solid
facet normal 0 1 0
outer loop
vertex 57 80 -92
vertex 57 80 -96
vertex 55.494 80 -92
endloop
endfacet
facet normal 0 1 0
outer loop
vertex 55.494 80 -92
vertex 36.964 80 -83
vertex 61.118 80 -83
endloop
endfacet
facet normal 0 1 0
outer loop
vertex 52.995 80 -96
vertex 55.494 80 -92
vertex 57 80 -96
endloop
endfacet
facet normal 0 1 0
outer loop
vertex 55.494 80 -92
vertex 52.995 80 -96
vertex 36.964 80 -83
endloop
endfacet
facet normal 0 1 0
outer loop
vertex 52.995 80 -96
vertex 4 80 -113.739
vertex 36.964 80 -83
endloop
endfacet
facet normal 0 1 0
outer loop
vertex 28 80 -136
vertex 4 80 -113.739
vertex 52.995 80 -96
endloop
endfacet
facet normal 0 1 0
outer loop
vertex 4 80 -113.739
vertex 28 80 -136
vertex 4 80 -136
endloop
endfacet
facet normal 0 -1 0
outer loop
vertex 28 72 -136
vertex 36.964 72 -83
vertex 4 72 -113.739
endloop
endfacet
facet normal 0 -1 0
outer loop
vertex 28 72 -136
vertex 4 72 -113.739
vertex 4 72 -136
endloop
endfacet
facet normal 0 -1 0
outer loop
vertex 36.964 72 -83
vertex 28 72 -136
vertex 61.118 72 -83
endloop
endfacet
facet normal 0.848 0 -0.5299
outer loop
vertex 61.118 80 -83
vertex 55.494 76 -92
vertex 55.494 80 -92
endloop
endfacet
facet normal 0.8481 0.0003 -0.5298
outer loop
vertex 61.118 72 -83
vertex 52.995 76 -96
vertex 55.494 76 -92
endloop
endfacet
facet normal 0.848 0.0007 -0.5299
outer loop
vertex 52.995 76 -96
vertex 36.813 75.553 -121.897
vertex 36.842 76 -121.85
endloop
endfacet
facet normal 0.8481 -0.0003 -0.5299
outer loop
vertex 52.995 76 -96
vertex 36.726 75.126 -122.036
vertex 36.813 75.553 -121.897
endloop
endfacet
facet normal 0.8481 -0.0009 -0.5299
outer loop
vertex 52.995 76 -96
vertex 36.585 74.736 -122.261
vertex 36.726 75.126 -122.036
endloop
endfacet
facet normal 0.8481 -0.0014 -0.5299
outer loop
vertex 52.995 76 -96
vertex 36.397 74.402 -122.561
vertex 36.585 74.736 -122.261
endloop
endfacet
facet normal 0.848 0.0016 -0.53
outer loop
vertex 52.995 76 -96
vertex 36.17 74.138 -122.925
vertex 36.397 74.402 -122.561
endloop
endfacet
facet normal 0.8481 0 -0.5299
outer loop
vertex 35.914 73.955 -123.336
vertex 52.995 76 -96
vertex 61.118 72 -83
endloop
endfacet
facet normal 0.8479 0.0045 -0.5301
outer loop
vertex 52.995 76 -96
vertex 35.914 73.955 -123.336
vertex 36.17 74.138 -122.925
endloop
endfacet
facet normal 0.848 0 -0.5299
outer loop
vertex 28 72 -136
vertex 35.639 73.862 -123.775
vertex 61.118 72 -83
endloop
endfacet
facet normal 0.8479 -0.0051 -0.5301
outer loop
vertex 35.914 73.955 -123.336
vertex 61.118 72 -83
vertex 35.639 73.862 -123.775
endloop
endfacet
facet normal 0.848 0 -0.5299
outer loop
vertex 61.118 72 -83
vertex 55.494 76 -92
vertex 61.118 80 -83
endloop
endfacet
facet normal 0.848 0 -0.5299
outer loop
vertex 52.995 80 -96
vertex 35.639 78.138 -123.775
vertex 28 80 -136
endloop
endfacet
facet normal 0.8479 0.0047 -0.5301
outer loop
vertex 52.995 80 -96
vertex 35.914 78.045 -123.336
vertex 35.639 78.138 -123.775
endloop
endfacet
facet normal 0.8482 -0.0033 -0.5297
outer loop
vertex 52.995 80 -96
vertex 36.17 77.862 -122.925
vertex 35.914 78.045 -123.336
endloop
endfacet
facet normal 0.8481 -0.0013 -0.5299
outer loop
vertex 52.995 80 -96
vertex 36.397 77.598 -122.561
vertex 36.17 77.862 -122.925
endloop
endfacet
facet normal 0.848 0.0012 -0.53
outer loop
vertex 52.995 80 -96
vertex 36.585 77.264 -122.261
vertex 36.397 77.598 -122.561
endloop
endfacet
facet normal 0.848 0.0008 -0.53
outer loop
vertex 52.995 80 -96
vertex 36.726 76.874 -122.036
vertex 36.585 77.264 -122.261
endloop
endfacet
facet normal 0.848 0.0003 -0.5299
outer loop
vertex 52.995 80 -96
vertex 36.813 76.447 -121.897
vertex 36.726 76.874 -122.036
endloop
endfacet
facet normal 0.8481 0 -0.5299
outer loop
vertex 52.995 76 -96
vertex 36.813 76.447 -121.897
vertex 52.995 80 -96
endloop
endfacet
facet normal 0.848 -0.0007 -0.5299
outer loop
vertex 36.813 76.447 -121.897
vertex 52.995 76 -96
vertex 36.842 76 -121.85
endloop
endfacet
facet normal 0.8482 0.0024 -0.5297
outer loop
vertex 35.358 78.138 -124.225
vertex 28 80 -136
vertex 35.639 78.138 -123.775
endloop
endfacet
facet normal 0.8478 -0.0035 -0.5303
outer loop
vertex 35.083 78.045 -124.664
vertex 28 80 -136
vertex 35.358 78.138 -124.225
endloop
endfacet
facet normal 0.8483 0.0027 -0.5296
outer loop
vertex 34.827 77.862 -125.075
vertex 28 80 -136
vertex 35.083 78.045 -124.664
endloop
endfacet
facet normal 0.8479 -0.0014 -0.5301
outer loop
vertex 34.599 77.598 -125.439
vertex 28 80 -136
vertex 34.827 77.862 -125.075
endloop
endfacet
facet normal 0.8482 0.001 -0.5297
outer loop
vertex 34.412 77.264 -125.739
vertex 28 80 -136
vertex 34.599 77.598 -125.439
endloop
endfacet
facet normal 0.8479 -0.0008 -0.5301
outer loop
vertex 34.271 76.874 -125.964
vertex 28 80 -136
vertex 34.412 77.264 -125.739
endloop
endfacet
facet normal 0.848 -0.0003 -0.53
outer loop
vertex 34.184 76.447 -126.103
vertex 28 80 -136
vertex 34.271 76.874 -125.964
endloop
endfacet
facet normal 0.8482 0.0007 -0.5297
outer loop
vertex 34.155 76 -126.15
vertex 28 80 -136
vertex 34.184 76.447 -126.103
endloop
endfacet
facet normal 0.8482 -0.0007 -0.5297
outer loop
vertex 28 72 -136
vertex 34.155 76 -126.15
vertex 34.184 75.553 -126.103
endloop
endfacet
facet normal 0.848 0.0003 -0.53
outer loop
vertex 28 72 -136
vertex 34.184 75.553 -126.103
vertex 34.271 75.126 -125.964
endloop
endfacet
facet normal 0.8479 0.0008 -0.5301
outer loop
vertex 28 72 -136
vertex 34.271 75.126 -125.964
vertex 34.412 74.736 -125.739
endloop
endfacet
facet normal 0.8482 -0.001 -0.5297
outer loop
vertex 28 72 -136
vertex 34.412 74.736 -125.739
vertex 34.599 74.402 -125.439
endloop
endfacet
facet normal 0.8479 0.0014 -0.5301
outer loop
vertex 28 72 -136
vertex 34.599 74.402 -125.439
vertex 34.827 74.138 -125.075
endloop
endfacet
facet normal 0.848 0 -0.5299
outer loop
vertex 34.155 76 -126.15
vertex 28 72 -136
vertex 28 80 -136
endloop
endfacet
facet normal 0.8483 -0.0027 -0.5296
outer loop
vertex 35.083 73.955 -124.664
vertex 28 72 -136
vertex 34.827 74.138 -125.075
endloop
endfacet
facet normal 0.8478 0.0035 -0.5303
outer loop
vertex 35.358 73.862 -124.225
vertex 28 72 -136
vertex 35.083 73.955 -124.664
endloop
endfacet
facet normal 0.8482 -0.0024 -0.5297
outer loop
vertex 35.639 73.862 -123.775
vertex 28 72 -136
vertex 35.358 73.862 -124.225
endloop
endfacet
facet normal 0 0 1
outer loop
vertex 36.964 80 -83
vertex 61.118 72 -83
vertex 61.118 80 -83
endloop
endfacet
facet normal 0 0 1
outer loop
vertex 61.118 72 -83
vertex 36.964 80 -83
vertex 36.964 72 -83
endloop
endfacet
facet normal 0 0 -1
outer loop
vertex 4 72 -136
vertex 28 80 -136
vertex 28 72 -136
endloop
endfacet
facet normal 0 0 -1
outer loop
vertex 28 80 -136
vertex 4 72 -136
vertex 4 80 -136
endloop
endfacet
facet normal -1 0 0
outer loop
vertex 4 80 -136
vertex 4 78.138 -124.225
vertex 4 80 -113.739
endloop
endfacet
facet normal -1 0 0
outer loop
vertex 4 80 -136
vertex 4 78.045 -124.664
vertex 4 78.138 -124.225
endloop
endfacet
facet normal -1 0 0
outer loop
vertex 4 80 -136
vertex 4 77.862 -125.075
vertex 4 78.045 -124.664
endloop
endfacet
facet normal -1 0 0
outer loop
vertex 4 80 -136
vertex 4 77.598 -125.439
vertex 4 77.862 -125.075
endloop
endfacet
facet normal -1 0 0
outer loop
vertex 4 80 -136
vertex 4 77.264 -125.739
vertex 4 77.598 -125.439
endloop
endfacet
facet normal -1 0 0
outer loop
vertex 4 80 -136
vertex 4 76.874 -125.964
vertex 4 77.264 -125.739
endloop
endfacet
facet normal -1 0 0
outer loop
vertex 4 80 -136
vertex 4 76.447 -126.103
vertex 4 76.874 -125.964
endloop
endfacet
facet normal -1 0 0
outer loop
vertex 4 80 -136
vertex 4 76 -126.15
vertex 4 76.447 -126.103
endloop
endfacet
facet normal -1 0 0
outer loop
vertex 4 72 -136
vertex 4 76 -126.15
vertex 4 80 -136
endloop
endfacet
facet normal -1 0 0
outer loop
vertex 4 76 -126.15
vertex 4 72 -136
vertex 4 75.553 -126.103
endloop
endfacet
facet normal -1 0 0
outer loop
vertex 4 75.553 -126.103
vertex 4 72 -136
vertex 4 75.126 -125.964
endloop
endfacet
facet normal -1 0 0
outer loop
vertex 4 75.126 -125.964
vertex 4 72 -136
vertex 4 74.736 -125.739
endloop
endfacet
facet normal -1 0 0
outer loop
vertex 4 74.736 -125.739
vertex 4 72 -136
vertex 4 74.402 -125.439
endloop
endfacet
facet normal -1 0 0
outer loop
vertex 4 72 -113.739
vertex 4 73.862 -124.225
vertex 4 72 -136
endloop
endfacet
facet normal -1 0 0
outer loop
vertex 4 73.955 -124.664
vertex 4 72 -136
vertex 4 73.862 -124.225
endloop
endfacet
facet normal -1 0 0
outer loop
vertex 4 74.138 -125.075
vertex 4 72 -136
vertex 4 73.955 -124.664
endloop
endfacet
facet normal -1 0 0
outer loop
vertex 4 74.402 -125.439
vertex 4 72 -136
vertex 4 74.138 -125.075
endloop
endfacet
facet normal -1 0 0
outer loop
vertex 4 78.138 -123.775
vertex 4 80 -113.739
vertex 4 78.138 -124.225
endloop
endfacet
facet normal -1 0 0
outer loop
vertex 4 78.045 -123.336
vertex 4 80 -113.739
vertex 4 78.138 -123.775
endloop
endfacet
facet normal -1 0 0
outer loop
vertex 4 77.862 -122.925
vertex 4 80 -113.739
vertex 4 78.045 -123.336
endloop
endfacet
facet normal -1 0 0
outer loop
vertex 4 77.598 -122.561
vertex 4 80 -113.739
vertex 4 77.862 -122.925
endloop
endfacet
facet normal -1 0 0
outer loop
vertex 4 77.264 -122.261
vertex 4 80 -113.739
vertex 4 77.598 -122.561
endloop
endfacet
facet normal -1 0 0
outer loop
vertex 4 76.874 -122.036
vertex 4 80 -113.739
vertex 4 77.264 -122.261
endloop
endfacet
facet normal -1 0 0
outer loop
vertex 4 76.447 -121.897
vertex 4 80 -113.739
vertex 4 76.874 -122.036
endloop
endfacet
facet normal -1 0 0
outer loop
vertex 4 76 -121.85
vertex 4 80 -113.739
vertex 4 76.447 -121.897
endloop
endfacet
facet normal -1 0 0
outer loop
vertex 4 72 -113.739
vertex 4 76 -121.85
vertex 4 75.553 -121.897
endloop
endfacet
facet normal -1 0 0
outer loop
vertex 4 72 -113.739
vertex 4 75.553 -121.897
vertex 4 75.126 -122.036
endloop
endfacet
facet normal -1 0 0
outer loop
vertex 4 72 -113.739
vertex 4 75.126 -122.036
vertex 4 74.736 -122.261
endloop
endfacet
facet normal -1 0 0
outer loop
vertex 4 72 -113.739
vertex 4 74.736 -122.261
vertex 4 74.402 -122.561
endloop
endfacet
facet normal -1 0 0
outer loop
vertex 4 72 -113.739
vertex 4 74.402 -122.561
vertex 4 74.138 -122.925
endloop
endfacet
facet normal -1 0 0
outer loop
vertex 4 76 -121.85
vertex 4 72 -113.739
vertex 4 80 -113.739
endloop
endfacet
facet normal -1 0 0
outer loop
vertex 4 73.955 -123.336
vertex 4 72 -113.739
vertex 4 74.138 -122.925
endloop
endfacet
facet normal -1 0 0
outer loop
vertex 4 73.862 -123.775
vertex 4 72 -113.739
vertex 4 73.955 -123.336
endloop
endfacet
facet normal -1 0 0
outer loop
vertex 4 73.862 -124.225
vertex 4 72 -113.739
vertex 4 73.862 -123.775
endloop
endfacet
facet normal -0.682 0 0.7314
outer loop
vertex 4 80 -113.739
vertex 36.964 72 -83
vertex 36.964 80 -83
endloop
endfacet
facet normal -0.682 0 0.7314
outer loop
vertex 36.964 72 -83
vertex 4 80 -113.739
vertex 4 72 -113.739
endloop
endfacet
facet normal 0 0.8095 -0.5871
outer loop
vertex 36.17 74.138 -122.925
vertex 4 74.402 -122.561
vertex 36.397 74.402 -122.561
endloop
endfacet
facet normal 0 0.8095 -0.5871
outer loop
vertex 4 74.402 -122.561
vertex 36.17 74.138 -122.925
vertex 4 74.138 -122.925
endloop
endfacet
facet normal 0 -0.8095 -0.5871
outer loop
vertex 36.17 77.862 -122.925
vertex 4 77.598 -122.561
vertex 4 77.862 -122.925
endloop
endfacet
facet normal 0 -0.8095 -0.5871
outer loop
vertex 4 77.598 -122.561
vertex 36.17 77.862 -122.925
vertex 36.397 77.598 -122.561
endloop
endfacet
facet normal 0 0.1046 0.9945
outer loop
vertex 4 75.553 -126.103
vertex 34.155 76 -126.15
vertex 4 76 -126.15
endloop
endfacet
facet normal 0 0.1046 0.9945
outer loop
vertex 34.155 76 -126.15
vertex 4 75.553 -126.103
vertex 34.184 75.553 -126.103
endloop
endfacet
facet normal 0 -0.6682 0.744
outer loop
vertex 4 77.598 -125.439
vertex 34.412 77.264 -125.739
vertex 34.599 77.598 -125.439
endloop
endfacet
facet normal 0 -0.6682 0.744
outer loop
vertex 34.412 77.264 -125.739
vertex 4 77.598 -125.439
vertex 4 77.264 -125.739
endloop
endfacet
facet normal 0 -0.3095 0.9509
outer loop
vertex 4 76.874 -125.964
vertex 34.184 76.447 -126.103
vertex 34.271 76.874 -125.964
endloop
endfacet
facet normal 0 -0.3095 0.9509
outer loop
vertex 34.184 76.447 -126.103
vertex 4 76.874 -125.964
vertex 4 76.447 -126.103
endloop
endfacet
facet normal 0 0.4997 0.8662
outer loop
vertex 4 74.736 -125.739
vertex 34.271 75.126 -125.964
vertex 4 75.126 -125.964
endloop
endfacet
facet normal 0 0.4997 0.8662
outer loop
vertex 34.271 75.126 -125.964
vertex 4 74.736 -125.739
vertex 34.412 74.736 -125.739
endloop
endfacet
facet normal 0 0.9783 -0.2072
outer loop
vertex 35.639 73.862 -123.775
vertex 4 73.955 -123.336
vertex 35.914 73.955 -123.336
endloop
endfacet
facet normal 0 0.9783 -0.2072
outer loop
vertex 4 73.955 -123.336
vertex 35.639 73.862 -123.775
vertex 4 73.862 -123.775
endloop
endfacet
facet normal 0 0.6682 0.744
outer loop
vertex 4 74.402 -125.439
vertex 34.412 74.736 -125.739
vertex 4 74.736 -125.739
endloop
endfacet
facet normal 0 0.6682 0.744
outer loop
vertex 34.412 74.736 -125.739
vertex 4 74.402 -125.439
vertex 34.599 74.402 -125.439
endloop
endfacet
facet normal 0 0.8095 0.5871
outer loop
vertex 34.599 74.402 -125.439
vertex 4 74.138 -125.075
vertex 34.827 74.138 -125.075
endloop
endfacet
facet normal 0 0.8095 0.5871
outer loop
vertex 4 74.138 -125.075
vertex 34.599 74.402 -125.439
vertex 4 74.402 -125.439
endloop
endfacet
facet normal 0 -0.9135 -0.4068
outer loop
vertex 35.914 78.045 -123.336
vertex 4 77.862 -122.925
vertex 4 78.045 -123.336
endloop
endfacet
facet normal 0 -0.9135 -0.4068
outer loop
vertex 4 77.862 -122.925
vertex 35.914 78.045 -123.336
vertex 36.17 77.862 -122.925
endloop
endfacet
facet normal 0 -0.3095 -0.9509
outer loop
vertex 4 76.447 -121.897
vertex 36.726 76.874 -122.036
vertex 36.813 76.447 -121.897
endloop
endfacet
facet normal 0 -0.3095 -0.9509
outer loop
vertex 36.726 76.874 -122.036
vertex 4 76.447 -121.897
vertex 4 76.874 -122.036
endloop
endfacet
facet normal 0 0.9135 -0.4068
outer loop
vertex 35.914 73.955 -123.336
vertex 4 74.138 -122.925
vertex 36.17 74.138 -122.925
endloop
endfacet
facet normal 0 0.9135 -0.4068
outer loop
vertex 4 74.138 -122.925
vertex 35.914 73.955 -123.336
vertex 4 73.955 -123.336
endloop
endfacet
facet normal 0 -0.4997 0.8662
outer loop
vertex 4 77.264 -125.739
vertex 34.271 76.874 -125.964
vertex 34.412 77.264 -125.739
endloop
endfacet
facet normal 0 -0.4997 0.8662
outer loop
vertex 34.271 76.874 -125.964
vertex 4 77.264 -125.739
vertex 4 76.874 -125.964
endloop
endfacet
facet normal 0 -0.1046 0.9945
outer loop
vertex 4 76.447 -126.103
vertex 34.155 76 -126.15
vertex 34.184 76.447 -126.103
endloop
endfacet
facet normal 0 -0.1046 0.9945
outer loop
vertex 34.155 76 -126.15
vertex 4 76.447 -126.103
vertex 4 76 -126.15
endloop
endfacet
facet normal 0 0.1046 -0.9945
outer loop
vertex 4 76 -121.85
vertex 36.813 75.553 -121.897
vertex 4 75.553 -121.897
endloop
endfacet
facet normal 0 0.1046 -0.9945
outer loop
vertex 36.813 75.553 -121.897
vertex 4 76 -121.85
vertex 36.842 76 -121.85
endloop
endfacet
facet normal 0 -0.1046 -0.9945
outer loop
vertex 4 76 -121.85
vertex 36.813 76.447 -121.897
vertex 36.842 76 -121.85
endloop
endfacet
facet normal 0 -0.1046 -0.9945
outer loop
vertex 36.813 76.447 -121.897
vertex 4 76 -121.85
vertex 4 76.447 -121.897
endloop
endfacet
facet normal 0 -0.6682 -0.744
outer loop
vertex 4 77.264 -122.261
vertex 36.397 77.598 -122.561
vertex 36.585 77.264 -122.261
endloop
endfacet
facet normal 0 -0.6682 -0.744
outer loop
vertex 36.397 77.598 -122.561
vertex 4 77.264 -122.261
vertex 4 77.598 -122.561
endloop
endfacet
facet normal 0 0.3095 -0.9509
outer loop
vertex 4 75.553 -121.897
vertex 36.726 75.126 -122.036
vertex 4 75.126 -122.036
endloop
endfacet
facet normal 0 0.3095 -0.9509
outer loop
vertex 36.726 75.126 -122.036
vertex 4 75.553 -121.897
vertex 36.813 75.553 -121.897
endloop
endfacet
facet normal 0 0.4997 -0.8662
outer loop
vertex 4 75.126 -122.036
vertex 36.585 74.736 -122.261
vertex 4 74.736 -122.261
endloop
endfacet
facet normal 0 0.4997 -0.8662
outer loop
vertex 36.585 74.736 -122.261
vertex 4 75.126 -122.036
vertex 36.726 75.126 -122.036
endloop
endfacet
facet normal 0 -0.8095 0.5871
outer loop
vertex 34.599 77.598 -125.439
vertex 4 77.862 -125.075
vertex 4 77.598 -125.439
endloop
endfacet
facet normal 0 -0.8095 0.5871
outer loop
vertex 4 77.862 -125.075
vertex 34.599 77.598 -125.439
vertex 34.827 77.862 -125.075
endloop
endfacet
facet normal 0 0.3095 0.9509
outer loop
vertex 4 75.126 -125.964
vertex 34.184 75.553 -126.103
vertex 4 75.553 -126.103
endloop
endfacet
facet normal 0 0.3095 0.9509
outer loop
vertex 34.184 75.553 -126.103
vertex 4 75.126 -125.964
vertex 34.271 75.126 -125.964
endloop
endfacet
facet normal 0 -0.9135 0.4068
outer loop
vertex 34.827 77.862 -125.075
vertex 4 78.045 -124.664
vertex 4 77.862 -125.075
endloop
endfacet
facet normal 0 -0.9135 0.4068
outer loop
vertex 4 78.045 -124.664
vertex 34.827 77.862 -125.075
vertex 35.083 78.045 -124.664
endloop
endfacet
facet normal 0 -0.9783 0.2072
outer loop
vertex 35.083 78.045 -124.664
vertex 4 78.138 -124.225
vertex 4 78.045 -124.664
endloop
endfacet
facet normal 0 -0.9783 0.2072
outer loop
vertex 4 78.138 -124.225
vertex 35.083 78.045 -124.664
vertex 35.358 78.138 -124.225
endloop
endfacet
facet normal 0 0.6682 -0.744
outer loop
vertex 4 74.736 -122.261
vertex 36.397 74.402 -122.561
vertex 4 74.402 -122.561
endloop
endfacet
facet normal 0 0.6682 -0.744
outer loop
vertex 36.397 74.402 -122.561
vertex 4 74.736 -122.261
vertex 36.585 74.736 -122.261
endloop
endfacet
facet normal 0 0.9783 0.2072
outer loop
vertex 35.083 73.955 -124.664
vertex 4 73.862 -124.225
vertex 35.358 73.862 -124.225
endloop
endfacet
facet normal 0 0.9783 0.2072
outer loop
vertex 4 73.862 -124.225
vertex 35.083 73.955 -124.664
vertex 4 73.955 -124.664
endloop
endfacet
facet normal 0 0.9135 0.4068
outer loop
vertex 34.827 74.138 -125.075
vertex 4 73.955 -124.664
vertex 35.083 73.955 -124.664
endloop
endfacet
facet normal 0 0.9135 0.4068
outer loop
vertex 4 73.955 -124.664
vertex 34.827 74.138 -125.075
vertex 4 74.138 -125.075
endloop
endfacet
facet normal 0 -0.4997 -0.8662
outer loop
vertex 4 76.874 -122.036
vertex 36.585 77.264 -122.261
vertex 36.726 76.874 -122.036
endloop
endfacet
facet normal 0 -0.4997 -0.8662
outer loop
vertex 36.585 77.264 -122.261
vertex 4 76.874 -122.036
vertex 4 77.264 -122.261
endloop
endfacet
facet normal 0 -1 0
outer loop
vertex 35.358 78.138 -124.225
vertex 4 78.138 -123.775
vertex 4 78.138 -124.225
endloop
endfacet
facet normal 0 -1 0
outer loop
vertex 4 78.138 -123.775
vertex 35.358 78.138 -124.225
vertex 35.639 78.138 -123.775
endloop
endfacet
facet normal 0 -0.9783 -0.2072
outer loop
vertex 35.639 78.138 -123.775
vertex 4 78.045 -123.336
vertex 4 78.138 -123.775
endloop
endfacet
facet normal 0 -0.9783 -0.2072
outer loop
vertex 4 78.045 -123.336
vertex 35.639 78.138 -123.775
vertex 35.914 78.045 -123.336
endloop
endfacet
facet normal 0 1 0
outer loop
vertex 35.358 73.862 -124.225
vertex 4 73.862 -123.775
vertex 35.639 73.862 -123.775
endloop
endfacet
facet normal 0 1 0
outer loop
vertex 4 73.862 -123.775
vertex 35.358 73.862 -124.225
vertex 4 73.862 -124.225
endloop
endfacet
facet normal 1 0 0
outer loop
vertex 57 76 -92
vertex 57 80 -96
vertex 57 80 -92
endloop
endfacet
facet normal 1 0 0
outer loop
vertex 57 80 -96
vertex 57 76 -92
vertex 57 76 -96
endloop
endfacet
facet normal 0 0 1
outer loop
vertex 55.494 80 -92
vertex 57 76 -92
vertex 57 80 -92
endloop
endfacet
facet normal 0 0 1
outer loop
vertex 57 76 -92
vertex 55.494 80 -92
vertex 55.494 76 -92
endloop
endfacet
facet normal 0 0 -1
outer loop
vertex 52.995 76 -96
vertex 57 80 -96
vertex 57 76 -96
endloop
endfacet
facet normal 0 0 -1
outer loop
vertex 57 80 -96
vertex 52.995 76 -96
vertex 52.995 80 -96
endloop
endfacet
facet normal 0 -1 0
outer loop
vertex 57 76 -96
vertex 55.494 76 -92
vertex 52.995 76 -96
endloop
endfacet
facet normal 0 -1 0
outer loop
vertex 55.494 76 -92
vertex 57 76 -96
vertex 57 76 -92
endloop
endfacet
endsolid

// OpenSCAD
// left part of bottom guard rail for left entry
color ("teal")
union(){
difference(){
union(){    
    // left wall
    translate([-10,72,-135])
    rotate([0,32,0])
    cube([35,8,85]);
}
    // clean up for front part of guard rail
    translate([28,72,-136])
    rotate([0,32,0])
    cube([5,40,80]);

    // top clean up
    translate([10,60,-83])
    cube([65,60,30]);

    // bottom clean up
    translate([0,60,-160])
    cube([40,60,24]);
    
    // clean up on bracket side
    // bottom
    translate([-30,60,-150])
    cube([34,60,50]);
    
    // top at an angle
    translate([-40,71,-112])
    rotate([0,47,0])
    cube([31.28,42,87]);
    
    // left clean up
    translate([0,66,-160])
    cube([66,6,100]);
    
    // hole for screw
    translate([-4,76,-124])
    rotate([0,90,0])
    cylinder(r=2.15,60, $fn=30);
}
    // notch to secure left piece
    translate([52,76,-96])
    cube([5,4,4]);
}
